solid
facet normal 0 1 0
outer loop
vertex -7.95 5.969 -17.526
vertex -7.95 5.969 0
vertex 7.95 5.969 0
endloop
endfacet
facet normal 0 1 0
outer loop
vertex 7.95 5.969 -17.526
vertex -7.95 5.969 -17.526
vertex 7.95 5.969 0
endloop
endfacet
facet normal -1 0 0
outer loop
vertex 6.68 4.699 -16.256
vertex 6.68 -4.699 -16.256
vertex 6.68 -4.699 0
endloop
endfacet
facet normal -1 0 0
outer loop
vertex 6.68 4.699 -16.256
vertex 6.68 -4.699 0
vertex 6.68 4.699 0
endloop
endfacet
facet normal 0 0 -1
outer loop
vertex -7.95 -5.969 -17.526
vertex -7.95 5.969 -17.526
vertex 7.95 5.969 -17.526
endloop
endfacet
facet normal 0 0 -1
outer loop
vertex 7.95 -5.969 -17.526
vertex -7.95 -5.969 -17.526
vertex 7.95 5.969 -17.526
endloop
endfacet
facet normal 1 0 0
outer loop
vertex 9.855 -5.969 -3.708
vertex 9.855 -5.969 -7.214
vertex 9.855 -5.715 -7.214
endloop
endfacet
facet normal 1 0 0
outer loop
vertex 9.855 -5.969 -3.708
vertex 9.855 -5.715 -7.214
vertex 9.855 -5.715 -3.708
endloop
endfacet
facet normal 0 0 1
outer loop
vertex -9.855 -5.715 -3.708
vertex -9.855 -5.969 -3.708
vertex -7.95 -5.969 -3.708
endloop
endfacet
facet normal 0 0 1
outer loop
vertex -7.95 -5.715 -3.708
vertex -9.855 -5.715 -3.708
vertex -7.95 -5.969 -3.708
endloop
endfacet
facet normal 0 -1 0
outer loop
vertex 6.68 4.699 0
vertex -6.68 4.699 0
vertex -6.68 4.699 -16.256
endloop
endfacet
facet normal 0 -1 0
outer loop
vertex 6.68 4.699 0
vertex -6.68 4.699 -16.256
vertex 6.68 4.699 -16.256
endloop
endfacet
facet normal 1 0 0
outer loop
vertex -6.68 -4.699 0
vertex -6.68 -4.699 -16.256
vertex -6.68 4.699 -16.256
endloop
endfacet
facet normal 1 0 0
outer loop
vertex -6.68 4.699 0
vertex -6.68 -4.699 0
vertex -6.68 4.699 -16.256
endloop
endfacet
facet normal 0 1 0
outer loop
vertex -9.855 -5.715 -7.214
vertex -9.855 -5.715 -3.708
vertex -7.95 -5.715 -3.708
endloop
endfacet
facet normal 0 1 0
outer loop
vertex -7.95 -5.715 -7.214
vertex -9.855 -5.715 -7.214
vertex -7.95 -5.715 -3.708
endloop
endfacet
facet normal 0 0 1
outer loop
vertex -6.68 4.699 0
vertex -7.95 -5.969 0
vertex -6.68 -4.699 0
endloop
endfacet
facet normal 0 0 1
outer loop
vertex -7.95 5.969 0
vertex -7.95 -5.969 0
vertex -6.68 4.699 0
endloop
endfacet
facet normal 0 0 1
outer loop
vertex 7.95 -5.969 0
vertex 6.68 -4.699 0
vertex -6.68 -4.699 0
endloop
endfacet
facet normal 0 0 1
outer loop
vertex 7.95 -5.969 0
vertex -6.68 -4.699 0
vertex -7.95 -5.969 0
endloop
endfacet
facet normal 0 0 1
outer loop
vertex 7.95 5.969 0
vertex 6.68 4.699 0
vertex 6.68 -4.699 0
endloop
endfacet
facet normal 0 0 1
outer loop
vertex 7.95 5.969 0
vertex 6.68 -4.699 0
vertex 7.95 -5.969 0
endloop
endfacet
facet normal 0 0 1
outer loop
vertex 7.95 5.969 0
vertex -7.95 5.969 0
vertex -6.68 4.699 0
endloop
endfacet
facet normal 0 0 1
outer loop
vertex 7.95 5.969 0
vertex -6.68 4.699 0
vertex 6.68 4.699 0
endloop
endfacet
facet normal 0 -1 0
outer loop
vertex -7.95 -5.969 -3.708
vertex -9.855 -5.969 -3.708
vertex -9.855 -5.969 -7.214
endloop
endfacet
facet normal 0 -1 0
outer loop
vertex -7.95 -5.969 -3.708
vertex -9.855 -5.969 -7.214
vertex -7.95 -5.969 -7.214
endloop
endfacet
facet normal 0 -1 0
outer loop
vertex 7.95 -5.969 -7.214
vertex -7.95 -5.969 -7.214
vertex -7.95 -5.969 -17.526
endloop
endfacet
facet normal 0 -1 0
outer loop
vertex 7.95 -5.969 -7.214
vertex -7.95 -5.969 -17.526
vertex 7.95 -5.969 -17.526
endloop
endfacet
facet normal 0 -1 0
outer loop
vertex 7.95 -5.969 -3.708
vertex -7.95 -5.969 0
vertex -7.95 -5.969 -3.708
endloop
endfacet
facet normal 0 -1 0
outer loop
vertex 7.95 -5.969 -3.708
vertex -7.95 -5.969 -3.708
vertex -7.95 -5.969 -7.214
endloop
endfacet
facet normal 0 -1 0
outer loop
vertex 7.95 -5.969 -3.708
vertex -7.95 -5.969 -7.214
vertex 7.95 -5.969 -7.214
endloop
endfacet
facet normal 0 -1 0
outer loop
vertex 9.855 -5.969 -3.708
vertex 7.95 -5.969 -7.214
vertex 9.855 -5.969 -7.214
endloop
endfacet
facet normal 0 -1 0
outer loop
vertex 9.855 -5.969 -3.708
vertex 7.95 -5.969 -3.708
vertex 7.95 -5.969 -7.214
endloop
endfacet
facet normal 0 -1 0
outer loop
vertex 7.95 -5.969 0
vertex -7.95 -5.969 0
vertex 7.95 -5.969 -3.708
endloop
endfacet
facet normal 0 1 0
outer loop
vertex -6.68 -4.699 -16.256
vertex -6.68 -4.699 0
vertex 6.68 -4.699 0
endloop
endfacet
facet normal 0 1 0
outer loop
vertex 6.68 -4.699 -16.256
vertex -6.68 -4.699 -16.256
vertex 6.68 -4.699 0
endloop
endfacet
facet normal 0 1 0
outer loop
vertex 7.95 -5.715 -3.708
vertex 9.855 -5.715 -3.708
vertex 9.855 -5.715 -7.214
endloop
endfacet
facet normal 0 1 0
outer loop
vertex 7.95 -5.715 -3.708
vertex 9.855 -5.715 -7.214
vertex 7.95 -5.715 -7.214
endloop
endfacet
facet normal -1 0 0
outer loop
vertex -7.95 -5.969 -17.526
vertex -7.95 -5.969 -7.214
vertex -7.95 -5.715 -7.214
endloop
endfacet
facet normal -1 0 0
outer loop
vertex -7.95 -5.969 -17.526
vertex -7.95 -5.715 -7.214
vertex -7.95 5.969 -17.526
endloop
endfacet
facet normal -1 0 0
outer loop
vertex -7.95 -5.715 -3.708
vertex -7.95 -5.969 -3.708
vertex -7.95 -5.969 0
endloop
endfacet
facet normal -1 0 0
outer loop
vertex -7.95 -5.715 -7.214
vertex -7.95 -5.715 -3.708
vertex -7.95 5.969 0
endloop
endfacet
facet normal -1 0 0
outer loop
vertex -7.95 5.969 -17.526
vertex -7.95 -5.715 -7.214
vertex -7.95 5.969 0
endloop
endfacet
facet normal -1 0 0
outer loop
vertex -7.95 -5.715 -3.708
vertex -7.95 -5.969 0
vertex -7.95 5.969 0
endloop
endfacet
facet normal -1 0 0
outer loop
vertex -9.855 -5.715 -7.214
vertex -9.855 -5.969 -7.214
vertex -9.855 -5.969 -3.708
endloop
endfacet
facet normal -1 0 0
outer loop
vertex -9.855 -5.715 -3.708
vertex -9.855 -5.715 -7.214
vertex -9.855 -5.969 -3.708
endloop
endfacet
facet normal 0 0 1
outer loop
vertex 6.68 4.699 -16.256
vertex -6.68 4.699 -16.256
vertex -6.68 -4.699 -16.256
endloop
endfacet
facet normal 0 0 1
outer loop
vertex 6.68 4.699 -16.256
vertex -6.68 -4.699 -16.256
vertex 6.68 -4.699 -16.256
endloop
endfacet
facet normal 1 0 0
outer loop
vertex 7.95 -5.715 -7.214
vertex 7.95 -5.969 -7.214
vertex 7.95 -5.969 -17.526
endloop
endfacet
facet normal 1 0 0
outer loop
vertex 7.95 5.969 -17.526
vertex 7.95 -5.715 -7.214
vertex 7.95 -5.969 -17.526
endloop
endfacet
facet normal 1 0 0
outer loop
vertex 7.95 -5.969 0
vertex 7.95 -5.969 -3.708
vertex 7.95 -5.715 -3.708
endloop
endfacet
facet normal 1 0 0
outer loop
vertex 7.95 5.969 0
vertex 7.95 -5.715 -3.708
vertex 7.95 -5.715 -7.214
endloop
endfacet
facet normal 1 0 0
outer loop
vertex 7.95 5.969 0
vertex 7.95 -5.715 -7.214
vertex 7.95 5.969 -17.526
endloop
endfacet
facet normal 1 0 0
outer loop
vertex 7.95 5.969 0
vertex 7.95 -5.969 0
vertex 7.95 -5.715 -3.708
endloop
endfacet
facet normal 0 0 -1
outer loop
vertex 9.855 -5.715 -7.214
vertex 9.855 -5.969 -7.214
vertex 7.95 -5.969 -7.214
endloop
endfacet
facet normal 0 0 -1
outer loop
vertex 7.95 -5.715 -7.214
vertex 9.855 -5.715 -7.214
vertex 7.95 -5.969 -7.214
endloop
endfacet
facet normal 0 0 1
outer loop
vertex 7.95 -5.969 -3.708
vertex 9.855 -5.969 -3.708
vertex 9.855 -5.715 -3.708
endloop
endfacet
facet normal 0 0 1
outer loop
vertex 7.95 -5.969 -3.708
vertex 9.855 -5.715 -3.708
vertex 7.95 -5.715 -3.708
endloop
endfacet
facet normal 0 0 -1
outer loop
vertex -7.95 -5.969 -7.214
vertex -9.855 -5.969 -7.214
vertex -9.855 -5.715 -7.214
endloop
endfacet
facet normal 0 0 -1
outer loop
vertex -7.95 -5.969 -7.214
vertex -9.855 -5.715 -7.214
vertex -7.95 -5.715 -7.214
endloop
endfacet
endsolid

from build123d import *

# Parameters (mm, degrees)
SKETCH1_W           = 15.9004
SKETCH1_H           = 11.938
BOSS_EXTRUDE1_DEPTH = 17.526
SHELL1_T            = -1.27
SKETCH2_W           = 1.905
SKETCH2_H           = 3.5052
BOSS_EXTRUDE2_DEPTH = 0.254


with BuildPart() as part:
    # Sketch1 → Boss-Extrude1 (new body)
    with BuildSketch(Plane.XY):
        Rectangle(SKETCH1_W, SKETCH1_H)
    extrude(amount=-BOSS_EXTRUDE1_DEPTH)

    # Shell1
    shell1_openings = [part.faces().sort_by_distance(p)[0] for p in [
        (0, 0, 0),
    ]]
    offset(amount=SHELL1_T, openings=shell1_openings, kind=Kind.INTERSECTION)

    # Sketch2 → Boss-Extrude2 (add)
    with BuildSketch(Plane.XZ.offset(5.969)):
        with Locations((-8.9027, -5.461)):
            Rectangle(SKETCH2_W, SKETCH2_H)
    boss_extrude2 = extrude(amount=-BOSS_EXTRUDE2_DEPTH)

    # Mirror1: Boss-Extrude2 across plane
    add(boss_extrude2.mirror(Plane(origin=(0, 0, 0), x_dir=(0, 0, 1), z_dir=(1, 0, 0))))


solid = part.part
